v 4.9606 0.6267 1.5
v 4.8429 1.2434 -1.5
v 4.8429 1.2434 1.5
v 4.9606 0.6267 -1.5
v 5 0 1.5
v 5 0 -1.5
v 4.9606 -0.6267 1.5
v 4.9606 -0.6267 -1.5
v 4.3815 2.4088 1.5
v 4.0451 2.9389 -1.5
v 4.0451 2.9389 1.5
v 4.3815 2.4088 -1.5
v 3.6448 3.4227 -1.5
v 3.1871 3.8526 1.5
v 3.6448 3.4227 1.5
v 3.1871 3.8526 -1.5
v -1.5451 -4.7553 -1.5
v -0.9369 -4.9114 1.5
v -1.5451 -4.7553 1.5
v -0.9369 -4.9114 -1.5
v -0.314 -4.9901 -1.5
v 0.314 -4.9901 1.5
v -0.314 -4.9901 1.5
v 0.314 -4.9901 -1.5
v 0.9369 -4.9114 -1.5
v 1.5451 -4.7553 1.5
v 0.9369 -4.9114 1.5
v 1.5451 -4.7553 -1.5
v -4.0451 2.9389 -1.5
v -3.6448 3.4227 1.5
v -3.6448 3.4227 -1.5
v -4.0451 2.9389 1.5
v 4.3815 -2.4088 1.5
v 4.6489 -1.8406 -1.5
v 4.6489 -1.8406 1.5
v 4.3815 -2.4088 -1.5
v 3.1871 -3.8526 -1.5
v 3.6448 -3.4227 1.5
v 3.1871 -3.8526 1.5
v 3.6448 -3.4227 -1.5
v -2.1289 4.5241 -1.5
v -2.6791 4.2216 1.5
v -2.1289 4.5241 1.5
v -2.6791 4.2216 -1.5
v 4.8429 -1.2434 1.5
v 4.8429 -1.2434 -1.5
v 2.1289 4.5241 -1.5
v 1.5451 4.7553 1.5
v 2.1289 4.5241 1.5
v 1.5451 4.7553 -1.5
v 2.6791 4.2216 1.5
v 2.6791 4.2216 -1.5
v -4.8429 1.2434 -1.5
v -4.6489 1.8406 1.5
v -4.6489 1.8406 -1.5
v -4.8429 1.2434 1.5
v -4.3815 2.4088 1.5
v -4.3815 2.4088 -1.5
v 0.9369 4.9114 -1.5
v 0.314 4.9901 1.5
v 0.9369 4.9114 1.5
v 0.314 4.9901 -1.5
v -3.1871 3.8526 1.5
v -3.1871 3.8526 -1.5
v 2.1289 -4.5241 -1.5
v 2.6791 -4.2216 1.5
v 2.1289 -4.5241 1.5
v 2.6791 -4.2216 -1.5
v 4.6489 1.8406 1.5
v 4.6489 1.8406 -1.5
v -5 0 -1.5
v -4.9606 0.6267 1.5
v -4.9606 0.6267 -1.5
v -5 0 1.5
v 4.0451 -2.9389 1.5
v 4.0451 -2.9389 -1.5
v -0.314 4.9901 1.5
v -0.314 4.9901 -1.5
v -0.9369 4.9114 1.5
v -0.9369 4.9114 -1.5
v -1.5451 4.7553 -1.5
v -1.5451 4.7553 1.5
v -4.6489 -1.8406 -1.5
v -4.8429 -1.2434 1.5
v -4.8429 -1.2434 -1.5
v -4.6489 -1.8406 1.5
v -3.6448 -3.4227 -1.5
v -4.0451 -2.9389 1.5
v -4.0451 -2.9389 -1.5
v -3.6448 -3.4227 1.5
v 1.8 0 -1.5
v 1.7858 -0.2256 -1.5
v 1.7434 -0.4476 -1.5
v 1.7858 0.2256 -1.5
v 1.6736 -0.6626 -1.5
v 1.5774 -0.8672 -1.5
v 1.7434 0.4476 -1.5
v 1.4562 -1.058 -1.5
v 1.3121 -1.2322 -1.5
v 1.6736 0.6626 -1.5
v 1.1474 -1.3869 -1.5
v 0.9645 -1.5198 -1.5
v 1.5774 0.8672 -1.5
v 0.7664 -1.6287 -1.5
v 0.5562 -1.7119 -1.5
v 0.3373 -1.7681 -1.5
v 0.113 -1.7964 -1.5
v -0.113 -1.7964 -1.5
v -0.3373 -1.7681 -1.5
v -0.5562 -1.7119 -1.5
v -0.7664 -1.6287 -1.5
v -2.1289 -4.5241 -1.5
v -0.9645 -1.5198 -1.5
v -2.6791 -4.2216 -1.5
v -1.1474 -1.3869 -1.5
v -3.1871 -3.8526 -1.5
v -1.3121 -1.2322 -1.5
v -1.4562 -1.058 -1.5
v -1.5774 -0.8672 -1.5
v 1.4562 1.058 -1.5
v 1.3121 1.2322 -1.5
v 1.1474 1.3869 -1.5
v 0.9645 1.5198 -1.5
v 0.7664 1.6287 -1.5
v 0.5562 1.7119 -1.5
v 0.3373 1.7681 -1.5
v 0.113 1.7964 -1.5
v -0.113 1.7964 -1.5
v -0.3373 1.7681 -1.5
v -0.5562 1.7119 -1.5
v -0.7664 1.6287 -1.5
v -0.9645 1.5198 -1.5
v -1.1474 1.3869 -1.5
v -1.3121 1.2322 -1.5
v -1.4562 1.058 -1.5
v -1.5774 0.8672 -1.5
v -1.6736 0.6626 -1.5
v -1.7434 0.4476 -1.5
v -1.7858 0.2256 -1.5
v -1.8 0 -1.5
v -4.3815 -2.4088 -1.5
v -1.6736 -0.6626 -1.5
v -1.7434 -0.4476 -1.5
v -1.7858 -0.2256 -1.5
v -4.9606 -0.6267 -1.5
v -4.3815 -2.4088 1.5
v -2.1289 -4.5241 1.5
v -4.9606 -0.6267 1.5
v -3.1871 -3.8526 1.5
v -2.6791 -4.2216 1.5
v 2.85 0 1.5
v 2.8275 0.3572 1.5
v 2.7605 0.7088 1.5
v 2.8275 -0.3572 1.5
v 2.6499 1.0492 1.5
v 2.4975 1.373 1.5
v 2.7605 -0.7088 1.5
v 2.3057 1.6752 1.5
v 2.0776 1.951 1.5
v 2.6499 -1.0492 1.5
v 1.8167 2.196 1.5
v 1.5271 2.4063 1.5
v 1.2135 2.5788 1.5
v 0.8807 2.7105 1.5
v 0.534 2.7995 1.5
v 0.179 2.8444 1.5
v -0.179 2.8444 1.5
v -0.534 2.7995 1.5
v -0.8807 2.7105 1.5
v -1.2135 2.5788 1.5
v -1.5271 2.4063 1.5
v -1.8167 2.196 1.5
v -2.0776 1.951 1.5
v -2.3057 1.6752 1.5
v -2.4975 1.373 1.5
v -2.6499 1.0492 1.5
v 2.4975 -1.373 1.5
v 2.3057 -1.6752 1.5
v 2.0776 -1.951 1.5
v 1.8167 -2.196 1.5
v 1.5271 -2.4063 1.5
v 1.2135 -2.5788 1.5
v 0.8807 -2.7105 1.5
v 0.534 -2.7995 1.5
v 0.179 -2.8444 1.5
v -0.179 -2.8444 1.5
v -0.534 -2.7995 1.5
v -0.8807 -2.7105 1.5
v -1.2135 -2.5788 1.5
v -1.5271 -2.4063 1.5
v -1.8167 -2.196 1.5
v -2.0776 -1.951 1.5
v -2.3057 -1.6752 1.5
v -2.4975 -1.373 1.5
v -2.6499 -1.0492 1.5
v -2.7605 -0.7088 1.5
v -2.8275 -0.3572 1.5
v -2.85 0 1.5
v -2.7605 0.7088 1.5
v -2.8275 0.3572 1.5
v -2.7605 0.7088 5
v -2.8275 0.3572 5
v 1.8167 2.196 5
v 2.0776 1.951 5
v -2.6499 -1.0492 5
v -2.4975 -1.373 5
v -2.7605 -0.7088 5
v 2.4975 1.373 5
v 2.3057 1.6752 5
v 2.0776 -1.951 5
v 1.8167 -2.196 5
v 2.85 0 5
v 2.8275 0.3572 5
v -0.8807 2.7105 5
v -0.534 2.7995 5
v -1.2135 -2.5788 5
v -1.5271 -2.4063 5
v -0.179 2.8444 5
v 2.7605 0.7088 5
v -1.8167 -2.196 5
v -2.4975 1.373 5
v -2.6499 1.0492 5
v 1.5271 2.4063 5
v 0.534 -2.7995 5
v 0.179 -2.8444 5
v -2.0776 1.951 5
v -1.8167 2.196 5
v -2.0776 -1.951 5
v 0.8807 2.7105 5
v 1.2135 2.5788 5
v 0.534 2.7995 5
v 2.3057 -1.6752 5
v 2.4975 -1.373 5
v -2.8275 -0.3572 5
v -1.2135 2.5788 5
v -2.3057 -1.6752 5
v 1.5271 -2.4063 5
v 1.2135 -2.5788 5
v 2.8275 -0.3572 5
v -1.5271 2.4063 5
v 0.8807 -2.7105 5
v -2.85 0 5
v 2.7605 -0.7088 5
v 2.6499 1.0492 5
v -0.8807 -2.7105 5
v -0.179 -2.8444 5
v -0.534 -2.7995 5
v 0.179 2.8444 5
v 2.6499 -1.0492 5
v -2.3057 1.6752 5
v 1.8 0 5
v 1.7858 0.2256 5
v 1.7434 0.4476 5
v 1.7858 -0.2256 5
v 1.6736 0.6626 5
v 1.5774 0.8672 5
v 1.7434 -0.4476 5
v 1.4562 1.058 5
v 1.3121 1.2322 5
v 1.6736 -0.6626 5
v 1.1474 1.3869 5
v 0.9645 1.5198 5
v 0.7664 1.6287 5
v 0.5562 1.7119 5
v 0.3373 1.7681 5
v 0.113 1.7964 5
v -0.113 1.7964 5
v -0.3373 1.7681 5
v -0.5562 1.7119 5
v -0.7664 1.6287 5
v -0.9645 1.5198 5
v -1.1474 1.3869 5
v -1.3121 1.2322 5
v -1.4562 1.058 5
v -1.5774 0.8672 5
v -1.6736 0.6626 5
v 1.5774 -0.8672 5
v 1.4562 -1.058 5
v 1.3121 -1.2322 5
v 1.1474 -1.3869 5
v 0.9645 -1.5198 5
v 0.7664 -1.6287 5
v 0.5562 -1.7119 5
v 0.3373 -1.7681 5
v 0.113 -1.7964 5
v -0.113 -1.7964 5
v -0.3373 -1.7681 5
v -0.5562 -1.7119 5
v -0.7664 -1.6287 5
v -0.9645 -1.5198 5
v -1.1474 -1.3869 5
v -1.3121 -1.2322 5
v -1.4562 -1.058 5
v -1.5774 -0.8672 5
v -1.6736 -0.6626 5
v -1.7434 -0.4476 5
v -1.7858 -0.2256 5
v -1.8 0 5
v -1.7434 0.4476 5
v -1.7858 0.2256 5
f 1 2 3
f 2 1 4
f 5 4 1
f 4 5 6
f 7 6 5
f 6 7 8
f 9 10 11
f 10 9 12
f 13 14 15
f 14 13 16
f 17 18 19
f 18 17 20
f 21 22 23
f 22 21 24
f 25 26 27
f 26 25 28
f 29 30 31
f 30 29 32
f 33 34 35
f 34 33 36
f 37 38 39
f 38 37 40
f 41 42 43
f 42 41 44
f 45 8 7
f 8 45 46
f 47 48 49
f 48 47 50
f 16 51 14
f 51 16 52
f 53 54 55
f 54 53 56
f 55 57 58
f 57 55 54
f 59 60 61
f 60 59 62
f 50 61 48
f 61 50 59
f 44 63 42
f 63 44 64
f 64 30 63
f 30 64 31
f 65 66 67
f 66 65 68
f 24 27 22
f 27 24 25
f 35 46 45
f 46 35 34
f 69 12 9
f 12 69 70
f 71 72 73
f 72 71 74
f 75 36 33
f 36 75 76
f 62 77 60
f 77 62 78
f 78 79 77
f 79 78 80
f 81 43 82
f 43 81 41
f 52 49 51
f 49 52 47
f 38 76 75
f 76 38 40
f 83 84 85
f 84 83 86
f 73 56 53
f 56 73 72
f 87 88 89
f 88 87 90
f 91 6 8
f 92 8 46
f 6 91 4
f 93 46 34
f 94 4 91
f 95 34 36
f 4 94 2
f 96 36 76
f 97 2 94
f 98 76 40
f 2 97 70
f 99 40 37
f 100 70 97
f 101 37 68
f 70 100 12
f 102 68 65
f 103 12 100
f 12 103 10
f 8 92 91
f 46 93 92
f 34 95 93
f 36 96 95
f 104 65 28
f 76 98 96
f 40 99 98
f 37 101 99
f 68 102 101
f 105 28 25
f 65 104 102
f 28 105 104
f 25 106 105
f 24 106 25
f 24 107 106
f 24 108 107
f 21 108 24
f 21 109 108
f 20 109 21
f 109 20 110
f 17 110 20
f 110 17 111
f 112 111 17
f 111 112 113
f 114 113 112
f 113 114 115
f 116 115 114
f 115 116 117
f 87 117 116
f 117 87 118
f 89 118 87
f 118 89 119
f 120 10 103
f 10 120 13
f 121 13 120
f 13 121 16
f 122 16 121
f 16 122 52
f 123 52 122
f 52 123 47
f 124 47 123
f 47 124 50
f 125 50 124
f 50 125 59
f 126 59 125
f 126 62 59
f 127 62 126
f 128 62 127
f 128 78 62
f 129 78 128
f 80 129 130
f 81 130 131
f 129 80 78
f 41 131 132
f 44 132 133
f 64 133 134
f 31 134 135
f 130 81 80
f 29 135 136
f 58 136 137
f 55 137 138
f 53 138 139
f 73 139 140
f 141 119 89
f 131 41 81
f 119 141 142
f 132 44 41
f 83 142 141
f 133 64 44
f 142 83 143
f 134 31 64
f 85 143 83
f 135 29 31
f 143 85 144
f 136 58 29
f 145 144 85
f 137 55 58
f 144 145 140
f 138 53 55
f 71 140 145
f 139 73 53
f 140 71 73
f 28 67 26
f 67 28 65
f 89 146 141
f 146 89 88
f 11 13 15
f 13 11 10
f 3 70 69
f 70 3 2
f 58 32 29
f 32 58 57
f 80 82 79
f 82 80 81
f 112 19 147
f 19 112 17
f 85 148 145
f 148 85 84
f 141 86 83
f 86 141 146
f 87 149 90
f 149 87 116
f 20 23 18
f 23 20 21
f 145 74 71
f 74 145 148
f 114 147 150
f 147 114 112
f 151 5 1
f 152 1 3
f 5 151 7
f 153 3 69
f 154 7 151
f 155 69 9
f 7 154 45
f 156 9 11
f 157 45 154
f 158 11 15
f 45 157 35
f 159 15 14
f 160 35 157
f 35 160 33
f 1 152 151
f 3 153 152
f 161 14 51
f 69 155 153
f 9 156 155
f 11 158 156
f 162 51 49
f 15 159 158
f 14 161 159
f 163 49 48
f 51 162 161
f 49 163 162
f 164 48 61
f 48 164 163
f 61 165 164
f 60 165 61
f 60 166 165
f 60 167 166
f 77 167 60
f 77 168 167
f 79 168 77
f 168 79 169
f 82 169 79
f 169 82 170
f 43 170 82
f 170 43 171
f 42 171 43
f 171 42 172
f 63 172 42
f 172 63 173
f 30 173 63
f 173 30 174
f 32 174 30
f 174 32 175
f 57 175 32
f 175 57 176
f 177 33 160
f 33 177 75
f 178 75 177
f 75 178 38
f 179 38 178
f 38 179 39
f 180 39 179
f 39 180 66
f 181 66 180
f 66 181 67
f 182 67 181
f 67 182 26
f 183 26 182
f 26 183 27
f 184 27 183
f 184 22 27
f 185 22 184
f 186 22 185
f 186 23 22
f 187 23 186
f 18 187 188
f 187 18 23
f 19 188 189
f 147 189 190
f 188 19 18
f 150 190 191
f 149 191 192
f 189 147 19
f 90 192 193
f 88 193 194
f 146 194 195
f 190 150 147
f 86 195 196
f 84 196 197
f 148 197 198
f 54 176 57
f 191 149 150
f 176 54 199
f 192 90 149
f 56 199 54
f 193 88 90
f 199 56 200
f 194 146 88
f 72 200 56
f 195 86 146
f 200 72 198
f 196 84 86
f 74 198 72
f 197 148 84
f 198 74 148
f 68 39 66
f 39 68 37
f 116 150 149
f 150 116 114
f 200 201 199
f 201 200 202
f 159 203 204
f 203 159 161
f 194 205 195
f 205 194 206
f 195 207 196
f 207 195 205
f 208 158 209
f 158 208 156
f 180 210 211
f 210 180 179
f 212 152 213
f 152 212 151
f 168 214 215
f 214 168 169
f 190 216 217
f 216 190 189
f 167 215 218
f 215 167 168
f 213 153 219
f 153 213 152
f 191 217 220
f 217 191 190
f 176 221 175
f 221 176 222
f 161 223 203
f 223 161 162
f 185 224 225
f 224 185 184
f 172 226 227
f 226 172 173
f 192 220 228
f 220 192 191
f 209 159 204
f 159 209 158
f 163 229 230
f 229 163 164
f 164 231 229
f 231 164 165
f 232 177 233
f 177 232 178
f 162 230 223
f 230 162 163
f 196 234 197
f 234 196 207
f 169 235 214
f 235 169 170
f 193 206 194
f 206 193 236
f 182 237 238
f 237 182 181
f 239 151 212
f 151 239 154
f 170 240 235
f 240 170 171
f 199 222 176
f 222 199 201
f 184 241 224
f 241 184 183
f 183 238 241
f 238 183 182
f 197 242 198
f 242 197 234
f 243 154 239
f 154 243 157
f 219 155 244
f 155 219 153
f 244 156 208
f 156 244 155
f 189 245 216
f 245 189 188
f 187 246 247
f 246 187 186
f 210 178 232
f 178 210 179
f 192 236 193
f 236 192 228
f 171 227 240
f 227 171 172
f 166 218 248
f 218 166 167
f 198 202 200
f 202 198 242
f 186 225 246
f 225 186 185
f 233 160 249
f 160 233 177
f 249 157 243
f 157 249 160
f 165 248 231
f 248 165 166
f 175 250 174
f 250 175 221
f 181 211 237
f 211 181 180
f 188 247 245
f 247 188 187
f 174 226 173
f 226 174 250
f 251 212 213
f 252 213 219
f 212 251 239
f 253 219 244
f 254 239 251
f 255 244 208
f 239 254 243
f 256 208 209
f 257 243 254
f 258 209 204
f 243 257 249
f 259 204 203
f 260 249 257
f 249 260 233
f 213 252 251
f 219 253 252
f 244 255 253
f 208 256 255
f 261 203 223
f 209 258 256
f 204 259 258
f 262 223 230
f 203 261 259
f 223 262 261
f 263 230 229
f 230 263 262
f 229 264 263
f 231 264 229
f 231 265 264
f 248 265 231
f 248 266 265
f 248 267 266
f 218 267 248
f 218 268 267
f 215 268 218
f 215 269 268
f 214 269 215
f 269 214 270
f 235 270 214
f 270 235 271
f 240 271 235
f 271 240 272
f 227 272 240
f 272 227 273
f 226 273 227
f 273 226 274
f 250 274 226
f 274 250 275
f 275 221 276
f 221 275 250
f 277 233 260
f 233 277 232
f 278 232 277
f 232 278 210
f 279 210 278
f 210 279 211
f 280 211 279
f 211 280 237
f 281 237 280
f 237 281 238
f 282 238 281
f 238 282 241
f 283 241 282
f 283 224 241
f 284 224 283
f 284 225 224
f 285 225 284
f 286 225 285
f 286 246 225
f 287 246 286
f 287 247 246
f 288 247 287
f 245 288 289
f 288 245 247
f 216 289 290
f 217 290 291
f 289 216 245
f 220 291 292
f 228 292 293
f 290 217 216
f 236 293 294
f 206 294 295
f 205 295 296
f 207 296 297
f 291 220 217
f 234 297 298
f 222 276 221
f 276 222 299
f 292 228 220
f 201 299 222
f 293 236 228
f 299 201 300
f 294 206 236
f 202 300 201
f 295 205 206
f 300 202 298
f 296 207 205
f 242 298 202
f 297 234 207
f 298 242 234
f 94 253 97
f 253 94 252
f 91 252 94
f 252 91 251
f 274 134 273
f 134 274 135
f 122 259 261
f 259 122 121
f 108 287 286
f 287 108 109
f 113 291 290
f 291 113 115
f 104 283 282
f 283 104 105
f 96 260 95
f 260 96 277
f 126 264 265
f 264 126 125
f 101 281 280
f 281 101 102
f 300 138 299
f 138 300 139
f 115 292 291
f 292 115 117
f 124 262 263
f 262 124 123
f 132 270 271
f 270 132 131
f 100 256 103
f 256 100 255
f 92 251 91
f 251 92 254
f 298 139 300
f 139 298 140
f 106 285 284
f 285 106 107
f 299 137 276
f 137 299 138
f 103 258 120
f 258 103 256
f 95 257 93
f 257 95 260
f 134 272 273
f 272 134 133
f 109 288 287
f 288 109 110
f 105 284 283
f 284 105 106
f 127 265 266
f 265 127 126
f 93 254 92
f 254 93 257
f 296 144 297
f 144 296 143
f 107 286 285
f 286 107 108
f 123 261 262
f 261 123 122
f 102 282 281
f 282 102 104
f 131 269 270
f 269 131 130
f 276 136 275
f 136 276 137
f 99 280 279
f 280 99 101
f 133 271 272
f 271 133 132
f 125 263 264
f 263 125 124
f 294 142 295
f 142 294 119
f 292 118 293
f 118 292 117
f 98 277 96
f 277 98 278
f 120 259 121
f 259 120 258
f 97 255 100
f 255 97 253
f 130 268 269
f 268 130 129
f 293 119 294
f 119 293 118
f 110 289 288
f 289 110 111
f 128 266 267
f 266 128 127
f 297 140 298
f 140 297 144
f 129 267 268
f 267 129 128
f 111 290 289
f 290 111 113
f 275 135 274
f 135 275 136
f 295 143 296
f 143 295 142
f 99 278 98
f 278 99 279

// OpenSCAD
$fn = 50;


difference() {
	union() {
		translate(v = [0, 0, -1.5000000000]) {
			rotate(a = [0, 0, 0]) {
				cylinder(h = 3, r = 5.0000000000);
			}
		}
		translate(v = [0, 0, -1.5000000000]) {
			rotate(a = [0, 0, 0]) {
				cylinder(h = 6.5000000000, r = 2.8500000000);
			}
		}
	}
	union() {
		translate(v = [0, 0, -125.0000000000]) {
			rotate(a = [0, 0, 0]) {
				cylinder(h = 250, r = 1.8000000000);
			}
		}
	}
}
